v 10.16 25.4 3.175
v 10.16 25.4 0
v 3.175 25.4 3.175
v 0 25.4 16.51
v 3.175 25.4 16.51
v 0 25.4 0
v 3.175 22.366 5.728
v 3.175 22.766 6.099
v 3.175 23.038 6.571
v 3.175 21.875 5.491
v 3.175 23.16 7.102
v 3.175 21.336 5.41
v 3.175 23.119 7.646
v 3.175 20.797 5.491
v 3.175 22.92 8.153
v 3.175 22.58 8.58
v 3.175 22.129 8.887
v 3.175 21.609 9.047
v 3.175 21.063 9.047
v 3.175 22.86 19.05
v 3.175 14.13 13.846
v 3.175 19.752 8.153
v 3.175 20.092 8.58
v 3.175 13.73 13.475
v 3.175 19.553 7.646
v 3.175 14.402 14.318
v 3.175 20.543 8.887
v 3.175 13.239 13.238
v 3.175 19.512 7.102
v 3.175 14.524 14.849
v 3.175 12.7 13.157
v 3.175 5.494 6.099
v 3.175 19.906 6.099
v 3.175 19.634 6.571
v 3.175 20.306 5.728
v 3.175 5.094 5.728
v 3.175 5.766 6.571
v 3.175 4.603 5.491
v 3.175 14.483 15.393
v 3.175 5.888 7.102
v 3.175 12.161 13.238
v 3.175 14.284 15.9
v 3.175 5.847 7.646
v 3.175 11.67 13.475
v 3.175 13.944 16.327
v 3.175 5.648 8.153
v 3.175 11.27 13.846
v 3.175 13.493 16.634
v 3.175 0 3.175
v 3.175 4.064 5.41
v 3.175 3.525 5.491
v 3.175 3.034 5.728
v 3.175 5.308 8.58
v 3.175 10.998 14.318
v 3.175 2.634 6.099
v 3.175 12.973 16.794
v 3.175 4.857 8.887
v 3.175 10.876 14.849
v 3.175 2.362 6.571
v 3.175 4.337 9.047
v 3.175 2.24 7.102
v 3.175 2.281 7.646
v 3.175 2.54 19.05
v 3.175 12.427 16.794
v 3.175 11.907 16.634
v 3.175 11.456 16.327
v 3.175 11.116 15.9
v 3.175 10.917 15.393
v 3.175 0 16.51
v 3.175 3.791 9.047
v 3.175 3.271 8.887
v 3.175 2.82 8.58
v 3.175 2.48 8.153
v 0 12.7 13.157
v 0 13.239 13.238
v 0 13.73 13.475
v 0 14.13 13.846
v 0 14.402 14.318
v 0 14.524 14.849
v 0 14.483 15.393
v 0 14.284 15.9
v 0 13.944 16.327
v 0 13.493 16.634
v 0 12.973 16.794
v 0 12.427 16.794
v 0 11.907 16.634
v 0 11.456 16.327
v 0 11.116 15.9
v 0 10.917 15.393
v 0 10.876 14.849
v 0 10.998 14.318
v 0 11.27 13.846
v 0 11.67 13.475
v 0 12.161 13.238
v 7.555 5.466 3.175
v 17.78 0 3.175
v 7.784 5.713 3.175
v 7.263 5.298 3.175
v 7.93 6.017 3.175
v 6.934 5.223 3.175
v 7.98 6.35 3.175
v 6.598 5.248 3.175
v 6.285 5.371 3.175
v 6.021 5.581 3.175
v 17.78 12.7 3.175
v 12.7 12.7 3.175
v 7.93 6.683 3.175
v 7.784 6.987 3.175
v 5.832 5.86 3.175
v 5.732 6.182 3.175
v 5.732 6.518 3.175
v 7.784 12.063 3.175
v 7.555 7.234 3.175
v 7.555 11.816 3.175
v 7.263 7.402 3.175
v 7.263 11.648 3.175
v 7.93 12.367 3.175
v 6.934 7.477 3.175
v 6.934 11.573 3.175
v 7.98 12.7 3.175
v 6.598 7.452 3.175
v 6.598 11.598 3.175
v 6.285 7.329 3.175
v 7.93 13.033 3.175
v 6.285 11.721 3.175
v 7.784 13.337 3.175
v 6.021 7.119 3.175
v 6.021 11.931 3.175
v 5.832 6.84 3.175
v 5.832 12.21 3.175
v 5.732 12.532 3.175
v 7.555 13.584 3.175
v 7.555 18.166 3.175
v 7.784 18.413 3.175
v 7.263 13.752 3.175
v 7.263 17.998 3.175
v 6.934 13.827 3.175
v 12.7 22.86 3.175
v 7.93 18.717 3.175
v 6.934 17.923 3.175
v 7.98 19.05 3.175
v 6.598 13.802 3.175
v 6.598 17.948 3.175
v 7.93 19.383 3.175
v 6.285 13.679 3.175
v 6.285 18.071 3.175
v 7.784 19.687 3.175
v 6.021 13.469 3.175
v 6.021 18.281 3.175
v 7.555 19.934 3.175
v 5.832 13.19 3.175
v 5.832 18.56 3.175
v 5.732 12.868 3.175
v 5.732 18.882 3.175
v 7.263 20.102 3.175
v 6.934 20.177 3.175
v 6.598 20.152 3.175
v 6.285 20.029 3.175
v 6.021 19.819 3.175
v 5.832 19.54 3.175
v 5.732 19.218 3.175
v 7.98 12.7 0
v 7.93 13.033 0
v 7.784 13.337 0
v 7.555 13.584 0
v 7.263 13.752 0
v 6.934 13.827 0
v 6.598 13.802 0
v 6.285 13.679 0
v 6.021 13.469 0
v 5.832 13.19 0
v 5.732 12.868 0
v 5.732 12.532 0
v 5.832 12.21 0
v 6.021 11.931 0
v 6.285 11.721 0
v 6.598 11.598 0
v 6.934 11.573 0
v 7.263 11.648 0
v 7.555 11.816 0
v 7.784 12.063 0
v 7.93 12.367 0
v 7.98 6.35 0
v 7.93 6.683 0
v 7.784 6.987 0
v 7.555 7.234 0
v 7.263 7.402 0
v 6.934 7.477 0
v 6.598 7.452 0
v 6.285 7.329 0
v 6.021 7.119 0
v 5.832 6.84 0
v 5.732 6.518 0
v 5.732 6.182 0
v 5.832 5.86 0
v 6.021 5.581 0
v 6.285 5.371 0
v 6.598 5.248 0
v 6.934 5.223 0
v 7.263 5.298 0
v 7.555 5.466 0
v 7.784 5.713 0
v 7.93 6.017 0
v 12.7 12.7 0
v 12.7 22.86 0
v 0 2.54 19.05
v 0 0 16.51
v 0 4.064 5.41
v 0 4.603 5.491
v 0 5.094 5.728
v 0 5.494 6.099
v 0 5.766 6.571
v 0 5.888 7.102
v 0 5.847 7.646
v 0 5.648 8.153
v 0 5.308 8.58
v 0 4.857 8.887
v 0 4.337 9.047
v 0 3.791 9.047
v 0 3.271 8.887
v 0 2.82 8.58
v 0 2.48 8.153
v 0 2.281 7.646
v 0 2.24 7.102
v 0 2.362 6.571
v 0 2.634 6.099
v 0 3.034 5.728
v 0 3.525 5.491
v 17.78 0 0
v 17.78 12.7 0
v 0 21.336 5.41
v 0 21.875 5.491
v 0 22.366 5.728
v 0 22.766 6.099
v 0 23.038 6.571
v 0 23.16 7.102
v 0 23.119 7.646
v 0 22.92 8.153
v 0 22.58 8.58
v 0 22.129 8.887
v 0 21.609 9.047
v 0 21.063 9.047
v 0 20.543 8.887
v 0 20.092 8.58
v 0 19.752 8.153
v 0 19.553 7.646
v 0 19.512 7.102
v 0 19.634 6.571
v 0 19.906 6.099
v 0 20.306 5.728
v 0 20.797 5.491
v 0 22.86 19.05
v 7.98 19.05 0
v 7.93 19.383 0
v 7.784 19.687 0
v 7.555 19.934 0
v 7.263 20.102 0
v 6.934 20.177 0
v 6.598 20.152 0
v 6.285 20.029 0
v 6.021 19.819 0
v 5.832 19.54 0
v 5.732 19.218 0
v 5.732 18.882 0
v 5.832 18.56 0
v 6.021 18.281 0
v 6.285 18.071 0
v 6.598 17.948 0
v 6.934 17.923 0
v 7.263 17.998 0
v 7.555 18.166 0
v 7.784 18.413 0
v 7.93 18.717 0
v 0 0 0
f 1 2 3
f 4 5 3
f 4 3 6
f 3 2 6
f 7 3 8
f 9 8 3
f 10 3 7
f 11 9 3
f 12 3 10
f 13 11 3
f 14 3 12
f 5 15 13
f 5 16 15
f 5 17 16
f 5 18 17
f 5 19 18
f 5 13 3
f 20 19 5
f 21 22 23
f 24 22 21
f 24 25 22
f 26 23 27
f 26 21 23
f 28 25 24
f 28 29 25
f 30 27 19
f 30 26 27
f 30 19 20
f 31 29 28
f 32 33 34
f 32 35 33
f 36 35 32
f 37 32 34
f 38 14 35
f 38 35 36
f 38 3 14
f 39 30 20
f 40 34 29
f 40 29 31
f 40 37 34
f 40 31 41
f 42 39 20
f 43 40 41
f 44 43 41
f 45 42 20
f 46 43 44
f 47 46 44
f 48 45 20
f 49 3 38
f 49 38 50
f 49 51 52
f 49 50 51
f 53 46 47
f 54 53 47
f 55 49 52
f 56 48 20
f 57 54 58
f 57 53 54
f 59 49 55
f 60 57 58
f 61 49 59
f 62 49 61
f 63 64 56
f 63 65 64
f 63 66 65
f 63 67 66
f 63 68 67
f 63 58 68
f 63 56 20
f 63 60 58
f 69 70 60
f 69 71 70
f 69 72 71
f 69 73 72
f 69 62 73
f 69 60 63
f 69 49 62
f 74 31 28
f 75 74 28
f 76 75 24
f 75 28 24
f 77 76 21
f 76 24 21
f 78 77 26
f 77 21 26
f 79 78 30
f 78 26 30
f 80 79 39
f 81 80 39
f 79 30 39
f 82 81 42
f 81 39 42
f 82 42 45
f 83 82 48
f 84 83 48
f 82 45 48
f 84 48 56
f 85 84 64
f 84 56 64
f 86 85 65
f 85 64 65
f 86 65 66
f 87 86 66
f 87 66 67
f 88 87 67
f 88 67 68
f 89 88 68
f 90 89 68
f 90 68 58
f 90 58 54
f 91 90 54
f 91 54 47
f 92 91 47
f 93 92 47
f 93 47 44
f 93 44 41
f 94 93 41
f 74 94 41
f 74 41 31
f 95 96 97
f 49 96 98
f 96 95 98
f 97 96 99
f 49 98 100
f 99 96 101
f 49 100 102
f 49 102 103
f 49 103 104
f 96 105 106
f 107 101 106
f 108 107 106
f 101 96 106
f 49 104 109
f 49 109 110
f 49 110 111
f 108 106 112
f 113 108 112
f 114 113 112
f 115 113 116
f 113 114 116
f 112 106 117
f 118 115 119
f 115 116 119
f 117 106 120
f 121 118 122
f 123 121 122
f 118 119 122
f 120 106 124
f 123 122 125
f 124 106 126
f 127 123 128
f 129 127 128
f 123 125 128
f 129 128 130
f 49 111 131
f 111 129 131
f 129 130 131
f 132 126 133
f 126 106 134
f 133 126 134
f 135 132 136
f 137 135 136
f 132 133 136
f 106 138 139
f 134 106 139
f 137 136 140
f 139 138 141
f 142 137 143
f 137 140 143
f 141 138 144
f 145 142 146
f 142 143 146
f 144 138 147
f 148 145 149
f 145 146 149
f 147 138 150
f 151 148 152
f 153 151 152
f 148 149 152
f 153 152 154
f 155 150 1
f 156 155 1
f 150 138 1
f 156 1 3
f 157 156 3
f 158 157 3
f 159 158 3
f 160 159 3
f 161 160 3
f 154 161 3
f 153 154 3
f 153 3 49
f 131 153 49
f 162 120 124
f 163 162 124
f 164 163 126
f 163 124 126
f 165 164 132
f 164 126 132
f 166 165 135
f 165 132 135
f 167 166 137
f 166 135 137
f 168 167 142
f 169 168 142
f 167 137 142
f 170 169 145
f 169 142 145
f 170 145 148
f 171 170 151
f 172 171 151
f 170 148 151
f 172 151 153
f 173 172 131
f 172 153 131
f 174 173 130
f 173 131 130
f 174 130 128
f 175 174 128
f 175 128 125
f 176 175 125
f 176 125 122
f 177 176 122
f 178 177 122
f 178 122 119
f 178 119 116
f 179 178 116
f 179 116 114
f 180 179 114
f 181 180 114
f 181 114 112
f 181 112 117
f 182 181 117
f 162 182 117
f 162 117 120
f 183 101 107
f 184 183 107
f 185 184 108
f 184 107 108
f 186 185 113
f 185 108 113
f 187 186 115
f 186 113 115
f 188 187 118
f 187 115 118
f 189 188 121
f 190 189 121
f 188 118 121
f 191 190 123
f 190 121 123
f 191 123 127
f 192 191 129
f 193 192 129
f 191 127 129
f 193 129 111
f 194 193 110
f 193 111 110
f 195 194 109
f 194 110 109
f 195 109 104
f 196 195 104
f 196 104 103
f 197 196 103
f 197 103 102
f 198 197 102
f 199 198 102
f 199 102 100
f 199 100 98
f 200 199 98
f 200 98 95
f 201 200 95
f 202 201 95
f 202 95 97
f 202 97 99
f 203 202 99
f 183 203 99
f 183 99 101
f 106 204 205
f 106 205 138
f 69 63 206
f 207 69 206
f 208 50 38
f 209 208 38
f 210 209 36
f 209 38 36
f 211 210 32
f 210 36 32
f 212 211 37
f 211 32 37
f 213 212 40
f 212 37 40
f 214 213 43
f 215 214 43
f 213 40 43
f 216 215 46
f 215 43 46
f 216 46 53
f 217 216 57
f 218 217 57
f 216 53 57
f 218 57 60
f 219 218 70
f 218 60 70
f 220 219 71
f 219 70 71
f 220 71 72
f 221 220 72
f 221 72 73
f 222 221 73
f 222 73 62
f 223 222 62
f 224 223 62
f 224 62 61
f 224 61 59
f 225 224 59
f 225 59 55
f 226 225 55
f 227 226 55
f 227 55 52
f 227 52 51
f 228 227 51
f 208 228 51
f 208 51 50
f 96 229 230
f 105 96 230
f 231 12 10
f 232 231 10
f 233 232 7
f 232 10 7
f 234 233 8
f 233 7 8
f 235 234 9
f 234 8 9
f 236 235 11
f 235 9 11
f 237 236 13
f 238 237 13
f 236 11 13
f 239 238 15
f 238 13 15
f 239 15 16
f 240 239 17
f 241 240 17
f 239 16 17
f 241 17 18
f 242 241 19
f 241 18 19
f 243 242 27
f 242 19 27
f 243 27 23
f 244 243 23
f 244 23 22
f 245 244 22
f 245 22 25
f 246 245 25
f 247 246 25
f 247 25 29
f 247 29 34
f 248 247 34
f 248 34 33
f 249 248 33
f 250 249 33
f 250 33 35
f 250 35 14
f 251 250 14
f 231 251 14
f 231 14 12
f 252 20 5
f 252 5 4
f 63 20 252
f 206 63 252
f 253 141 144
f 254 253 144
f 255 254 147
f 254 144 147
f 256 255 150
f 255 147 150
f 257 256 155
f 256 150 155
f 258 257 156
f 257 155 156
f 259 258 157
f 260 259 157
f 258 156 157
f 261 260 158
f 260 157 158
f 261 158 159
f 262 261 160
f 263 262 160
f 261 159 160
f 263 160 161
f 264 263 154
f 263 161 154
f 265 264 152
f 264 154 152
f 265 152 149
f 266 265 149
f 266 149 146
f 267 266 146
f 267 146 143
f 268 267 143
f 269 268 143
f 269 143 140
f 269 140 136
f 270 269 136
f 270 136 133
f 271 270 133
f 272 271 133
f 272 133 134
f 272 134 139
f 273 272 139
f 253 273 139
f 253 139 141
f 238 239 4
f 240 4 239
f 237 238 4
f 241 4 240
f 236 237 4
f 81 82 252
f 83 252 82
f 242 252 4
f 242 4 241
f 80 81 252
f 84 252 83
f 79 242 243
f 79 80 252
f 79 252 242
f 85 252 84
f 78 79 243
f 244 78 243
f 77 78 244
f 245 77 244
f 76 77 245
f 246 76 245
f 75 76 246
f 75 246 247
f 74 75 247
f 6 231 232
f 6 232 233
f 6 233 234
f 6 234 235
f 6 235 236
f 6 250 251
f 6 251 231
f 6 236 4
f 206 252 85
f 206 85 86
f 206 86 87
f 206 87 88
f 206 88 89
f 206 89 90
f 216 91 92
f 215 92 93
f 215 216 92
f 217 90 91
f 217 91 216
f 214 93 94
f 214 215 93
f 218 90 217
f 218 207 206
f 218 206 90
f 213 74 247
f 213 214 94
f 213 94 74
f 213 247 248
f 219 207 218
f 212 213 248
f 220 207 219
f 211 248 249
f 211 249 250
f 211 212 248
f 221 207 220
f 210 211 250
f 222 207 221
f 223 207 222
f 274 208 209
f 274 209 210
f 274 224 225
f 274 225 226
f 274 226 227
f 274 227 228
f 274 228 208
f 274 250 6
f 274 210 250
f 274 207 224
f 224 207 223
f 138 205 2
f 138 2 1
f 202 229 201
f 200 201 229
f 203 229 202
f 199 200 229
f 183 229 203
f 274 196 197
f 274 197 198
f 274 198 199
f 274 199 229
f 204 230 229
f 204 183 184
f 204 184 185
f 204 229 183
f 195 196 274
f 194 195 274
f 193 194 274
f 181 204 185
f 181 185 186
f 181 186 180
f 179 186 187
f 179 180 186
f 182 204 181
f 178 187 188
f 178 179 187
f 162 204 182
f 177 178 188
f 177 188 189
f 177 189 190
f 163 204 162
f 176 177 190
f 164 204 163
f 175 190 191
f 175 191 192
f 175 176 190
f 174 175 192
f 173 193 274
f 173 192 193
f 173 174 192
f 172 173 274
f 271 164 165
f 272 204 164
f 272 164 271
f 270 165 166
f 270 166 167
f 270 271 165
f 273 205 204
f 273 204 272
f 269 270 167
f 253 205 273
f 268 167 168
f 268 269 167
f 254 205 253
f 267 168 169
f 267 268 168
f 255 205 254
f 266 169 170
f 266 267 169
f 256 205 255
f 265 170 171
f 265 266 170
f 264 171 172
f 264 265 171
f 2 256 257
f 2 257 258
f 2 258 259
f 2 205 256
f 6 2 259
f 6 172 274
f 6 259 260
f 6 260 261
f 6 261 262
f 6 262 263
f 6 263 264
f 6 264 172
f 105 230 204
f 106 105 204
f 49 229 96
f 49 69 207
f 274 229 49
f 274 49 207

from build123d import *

# Parameters (mm, degrees)
BOSS_EXTRUDE1_DEPTH   = 25.4
F_6_CLEARANCE_HOLE1_D = 3.6576
CHAMFER1_SIZE         = 2.54
F_4_40_TAPPED_HOLE1_D = 2.2606
SKETCH8_W             = 7.62
SKETCH8_H             = 12.7
BOSS_EXTRUDE2_DEPTH   = 3.175


with BuildPart() as part:
    # Sketch1 → Boss-Extrude1 (new body)
    with BuildSketch(Plane(origin=(0, 0, 0), x_dir=(1, 0, 0), z_dir=(0, 1, 0))):
        Polygon((0, 0), (12.7, 0), (12.7, -3.175), (3.175, -3.175), (3.175, -19.05), (0, -19.05), align=None)
    extrude(amount=BOSS_EXTRUDE1_DEPTH)

    # #6 Clearance Hole1 (through all)
    with Locations(Plane.ZY):
        with Locations((7.239, 4.064), (7.239, 21.336), (14.986, 12.7)):
            Hole(F_6_CLEARANCE_HOLE1_D / 2)

    # Chamfer1
    chamfer1_edges = [part.edges().sort_by_distance(p)[0] for p in [
        (12.7, 25.4, 1.5875),
        (12.7, 0, 1.5875),
        (1.5875, 25.4, 19.05),
        (1.5875, 0, 19.05),
    ]]
    chamfer(chamfer1_edges, length=CHAMFER1_SIZE)

    # #4-40 Tapped Hole1 (through all)
    with Locations(Plane(origin=(0, 0, 0), x_dir=(-1, 0, 0), z_dir=(0, 0, -1))):
        with Locations((-6.8499944, 6.35), (-6.8499944, 12.7), (-6.8499944, 19.05)):
            Hole(F_4_40_TAPPED_HOLE1_D / 2)

    # Sketch8 → Boss-Extrude2 (add)
    with BuildSketch(Plane(origin=(0, 0, 0), x_dir=(-1, 0, 0), z_dir=(0, 0, -1))):
        with Locations((-13.97, 6.35)):
            Rectangle(SKETCH8_W, SKETCH8_H)
    extrude(amount=-BOSS_EXTRUDE2_DEPTH)


solid = part.part
